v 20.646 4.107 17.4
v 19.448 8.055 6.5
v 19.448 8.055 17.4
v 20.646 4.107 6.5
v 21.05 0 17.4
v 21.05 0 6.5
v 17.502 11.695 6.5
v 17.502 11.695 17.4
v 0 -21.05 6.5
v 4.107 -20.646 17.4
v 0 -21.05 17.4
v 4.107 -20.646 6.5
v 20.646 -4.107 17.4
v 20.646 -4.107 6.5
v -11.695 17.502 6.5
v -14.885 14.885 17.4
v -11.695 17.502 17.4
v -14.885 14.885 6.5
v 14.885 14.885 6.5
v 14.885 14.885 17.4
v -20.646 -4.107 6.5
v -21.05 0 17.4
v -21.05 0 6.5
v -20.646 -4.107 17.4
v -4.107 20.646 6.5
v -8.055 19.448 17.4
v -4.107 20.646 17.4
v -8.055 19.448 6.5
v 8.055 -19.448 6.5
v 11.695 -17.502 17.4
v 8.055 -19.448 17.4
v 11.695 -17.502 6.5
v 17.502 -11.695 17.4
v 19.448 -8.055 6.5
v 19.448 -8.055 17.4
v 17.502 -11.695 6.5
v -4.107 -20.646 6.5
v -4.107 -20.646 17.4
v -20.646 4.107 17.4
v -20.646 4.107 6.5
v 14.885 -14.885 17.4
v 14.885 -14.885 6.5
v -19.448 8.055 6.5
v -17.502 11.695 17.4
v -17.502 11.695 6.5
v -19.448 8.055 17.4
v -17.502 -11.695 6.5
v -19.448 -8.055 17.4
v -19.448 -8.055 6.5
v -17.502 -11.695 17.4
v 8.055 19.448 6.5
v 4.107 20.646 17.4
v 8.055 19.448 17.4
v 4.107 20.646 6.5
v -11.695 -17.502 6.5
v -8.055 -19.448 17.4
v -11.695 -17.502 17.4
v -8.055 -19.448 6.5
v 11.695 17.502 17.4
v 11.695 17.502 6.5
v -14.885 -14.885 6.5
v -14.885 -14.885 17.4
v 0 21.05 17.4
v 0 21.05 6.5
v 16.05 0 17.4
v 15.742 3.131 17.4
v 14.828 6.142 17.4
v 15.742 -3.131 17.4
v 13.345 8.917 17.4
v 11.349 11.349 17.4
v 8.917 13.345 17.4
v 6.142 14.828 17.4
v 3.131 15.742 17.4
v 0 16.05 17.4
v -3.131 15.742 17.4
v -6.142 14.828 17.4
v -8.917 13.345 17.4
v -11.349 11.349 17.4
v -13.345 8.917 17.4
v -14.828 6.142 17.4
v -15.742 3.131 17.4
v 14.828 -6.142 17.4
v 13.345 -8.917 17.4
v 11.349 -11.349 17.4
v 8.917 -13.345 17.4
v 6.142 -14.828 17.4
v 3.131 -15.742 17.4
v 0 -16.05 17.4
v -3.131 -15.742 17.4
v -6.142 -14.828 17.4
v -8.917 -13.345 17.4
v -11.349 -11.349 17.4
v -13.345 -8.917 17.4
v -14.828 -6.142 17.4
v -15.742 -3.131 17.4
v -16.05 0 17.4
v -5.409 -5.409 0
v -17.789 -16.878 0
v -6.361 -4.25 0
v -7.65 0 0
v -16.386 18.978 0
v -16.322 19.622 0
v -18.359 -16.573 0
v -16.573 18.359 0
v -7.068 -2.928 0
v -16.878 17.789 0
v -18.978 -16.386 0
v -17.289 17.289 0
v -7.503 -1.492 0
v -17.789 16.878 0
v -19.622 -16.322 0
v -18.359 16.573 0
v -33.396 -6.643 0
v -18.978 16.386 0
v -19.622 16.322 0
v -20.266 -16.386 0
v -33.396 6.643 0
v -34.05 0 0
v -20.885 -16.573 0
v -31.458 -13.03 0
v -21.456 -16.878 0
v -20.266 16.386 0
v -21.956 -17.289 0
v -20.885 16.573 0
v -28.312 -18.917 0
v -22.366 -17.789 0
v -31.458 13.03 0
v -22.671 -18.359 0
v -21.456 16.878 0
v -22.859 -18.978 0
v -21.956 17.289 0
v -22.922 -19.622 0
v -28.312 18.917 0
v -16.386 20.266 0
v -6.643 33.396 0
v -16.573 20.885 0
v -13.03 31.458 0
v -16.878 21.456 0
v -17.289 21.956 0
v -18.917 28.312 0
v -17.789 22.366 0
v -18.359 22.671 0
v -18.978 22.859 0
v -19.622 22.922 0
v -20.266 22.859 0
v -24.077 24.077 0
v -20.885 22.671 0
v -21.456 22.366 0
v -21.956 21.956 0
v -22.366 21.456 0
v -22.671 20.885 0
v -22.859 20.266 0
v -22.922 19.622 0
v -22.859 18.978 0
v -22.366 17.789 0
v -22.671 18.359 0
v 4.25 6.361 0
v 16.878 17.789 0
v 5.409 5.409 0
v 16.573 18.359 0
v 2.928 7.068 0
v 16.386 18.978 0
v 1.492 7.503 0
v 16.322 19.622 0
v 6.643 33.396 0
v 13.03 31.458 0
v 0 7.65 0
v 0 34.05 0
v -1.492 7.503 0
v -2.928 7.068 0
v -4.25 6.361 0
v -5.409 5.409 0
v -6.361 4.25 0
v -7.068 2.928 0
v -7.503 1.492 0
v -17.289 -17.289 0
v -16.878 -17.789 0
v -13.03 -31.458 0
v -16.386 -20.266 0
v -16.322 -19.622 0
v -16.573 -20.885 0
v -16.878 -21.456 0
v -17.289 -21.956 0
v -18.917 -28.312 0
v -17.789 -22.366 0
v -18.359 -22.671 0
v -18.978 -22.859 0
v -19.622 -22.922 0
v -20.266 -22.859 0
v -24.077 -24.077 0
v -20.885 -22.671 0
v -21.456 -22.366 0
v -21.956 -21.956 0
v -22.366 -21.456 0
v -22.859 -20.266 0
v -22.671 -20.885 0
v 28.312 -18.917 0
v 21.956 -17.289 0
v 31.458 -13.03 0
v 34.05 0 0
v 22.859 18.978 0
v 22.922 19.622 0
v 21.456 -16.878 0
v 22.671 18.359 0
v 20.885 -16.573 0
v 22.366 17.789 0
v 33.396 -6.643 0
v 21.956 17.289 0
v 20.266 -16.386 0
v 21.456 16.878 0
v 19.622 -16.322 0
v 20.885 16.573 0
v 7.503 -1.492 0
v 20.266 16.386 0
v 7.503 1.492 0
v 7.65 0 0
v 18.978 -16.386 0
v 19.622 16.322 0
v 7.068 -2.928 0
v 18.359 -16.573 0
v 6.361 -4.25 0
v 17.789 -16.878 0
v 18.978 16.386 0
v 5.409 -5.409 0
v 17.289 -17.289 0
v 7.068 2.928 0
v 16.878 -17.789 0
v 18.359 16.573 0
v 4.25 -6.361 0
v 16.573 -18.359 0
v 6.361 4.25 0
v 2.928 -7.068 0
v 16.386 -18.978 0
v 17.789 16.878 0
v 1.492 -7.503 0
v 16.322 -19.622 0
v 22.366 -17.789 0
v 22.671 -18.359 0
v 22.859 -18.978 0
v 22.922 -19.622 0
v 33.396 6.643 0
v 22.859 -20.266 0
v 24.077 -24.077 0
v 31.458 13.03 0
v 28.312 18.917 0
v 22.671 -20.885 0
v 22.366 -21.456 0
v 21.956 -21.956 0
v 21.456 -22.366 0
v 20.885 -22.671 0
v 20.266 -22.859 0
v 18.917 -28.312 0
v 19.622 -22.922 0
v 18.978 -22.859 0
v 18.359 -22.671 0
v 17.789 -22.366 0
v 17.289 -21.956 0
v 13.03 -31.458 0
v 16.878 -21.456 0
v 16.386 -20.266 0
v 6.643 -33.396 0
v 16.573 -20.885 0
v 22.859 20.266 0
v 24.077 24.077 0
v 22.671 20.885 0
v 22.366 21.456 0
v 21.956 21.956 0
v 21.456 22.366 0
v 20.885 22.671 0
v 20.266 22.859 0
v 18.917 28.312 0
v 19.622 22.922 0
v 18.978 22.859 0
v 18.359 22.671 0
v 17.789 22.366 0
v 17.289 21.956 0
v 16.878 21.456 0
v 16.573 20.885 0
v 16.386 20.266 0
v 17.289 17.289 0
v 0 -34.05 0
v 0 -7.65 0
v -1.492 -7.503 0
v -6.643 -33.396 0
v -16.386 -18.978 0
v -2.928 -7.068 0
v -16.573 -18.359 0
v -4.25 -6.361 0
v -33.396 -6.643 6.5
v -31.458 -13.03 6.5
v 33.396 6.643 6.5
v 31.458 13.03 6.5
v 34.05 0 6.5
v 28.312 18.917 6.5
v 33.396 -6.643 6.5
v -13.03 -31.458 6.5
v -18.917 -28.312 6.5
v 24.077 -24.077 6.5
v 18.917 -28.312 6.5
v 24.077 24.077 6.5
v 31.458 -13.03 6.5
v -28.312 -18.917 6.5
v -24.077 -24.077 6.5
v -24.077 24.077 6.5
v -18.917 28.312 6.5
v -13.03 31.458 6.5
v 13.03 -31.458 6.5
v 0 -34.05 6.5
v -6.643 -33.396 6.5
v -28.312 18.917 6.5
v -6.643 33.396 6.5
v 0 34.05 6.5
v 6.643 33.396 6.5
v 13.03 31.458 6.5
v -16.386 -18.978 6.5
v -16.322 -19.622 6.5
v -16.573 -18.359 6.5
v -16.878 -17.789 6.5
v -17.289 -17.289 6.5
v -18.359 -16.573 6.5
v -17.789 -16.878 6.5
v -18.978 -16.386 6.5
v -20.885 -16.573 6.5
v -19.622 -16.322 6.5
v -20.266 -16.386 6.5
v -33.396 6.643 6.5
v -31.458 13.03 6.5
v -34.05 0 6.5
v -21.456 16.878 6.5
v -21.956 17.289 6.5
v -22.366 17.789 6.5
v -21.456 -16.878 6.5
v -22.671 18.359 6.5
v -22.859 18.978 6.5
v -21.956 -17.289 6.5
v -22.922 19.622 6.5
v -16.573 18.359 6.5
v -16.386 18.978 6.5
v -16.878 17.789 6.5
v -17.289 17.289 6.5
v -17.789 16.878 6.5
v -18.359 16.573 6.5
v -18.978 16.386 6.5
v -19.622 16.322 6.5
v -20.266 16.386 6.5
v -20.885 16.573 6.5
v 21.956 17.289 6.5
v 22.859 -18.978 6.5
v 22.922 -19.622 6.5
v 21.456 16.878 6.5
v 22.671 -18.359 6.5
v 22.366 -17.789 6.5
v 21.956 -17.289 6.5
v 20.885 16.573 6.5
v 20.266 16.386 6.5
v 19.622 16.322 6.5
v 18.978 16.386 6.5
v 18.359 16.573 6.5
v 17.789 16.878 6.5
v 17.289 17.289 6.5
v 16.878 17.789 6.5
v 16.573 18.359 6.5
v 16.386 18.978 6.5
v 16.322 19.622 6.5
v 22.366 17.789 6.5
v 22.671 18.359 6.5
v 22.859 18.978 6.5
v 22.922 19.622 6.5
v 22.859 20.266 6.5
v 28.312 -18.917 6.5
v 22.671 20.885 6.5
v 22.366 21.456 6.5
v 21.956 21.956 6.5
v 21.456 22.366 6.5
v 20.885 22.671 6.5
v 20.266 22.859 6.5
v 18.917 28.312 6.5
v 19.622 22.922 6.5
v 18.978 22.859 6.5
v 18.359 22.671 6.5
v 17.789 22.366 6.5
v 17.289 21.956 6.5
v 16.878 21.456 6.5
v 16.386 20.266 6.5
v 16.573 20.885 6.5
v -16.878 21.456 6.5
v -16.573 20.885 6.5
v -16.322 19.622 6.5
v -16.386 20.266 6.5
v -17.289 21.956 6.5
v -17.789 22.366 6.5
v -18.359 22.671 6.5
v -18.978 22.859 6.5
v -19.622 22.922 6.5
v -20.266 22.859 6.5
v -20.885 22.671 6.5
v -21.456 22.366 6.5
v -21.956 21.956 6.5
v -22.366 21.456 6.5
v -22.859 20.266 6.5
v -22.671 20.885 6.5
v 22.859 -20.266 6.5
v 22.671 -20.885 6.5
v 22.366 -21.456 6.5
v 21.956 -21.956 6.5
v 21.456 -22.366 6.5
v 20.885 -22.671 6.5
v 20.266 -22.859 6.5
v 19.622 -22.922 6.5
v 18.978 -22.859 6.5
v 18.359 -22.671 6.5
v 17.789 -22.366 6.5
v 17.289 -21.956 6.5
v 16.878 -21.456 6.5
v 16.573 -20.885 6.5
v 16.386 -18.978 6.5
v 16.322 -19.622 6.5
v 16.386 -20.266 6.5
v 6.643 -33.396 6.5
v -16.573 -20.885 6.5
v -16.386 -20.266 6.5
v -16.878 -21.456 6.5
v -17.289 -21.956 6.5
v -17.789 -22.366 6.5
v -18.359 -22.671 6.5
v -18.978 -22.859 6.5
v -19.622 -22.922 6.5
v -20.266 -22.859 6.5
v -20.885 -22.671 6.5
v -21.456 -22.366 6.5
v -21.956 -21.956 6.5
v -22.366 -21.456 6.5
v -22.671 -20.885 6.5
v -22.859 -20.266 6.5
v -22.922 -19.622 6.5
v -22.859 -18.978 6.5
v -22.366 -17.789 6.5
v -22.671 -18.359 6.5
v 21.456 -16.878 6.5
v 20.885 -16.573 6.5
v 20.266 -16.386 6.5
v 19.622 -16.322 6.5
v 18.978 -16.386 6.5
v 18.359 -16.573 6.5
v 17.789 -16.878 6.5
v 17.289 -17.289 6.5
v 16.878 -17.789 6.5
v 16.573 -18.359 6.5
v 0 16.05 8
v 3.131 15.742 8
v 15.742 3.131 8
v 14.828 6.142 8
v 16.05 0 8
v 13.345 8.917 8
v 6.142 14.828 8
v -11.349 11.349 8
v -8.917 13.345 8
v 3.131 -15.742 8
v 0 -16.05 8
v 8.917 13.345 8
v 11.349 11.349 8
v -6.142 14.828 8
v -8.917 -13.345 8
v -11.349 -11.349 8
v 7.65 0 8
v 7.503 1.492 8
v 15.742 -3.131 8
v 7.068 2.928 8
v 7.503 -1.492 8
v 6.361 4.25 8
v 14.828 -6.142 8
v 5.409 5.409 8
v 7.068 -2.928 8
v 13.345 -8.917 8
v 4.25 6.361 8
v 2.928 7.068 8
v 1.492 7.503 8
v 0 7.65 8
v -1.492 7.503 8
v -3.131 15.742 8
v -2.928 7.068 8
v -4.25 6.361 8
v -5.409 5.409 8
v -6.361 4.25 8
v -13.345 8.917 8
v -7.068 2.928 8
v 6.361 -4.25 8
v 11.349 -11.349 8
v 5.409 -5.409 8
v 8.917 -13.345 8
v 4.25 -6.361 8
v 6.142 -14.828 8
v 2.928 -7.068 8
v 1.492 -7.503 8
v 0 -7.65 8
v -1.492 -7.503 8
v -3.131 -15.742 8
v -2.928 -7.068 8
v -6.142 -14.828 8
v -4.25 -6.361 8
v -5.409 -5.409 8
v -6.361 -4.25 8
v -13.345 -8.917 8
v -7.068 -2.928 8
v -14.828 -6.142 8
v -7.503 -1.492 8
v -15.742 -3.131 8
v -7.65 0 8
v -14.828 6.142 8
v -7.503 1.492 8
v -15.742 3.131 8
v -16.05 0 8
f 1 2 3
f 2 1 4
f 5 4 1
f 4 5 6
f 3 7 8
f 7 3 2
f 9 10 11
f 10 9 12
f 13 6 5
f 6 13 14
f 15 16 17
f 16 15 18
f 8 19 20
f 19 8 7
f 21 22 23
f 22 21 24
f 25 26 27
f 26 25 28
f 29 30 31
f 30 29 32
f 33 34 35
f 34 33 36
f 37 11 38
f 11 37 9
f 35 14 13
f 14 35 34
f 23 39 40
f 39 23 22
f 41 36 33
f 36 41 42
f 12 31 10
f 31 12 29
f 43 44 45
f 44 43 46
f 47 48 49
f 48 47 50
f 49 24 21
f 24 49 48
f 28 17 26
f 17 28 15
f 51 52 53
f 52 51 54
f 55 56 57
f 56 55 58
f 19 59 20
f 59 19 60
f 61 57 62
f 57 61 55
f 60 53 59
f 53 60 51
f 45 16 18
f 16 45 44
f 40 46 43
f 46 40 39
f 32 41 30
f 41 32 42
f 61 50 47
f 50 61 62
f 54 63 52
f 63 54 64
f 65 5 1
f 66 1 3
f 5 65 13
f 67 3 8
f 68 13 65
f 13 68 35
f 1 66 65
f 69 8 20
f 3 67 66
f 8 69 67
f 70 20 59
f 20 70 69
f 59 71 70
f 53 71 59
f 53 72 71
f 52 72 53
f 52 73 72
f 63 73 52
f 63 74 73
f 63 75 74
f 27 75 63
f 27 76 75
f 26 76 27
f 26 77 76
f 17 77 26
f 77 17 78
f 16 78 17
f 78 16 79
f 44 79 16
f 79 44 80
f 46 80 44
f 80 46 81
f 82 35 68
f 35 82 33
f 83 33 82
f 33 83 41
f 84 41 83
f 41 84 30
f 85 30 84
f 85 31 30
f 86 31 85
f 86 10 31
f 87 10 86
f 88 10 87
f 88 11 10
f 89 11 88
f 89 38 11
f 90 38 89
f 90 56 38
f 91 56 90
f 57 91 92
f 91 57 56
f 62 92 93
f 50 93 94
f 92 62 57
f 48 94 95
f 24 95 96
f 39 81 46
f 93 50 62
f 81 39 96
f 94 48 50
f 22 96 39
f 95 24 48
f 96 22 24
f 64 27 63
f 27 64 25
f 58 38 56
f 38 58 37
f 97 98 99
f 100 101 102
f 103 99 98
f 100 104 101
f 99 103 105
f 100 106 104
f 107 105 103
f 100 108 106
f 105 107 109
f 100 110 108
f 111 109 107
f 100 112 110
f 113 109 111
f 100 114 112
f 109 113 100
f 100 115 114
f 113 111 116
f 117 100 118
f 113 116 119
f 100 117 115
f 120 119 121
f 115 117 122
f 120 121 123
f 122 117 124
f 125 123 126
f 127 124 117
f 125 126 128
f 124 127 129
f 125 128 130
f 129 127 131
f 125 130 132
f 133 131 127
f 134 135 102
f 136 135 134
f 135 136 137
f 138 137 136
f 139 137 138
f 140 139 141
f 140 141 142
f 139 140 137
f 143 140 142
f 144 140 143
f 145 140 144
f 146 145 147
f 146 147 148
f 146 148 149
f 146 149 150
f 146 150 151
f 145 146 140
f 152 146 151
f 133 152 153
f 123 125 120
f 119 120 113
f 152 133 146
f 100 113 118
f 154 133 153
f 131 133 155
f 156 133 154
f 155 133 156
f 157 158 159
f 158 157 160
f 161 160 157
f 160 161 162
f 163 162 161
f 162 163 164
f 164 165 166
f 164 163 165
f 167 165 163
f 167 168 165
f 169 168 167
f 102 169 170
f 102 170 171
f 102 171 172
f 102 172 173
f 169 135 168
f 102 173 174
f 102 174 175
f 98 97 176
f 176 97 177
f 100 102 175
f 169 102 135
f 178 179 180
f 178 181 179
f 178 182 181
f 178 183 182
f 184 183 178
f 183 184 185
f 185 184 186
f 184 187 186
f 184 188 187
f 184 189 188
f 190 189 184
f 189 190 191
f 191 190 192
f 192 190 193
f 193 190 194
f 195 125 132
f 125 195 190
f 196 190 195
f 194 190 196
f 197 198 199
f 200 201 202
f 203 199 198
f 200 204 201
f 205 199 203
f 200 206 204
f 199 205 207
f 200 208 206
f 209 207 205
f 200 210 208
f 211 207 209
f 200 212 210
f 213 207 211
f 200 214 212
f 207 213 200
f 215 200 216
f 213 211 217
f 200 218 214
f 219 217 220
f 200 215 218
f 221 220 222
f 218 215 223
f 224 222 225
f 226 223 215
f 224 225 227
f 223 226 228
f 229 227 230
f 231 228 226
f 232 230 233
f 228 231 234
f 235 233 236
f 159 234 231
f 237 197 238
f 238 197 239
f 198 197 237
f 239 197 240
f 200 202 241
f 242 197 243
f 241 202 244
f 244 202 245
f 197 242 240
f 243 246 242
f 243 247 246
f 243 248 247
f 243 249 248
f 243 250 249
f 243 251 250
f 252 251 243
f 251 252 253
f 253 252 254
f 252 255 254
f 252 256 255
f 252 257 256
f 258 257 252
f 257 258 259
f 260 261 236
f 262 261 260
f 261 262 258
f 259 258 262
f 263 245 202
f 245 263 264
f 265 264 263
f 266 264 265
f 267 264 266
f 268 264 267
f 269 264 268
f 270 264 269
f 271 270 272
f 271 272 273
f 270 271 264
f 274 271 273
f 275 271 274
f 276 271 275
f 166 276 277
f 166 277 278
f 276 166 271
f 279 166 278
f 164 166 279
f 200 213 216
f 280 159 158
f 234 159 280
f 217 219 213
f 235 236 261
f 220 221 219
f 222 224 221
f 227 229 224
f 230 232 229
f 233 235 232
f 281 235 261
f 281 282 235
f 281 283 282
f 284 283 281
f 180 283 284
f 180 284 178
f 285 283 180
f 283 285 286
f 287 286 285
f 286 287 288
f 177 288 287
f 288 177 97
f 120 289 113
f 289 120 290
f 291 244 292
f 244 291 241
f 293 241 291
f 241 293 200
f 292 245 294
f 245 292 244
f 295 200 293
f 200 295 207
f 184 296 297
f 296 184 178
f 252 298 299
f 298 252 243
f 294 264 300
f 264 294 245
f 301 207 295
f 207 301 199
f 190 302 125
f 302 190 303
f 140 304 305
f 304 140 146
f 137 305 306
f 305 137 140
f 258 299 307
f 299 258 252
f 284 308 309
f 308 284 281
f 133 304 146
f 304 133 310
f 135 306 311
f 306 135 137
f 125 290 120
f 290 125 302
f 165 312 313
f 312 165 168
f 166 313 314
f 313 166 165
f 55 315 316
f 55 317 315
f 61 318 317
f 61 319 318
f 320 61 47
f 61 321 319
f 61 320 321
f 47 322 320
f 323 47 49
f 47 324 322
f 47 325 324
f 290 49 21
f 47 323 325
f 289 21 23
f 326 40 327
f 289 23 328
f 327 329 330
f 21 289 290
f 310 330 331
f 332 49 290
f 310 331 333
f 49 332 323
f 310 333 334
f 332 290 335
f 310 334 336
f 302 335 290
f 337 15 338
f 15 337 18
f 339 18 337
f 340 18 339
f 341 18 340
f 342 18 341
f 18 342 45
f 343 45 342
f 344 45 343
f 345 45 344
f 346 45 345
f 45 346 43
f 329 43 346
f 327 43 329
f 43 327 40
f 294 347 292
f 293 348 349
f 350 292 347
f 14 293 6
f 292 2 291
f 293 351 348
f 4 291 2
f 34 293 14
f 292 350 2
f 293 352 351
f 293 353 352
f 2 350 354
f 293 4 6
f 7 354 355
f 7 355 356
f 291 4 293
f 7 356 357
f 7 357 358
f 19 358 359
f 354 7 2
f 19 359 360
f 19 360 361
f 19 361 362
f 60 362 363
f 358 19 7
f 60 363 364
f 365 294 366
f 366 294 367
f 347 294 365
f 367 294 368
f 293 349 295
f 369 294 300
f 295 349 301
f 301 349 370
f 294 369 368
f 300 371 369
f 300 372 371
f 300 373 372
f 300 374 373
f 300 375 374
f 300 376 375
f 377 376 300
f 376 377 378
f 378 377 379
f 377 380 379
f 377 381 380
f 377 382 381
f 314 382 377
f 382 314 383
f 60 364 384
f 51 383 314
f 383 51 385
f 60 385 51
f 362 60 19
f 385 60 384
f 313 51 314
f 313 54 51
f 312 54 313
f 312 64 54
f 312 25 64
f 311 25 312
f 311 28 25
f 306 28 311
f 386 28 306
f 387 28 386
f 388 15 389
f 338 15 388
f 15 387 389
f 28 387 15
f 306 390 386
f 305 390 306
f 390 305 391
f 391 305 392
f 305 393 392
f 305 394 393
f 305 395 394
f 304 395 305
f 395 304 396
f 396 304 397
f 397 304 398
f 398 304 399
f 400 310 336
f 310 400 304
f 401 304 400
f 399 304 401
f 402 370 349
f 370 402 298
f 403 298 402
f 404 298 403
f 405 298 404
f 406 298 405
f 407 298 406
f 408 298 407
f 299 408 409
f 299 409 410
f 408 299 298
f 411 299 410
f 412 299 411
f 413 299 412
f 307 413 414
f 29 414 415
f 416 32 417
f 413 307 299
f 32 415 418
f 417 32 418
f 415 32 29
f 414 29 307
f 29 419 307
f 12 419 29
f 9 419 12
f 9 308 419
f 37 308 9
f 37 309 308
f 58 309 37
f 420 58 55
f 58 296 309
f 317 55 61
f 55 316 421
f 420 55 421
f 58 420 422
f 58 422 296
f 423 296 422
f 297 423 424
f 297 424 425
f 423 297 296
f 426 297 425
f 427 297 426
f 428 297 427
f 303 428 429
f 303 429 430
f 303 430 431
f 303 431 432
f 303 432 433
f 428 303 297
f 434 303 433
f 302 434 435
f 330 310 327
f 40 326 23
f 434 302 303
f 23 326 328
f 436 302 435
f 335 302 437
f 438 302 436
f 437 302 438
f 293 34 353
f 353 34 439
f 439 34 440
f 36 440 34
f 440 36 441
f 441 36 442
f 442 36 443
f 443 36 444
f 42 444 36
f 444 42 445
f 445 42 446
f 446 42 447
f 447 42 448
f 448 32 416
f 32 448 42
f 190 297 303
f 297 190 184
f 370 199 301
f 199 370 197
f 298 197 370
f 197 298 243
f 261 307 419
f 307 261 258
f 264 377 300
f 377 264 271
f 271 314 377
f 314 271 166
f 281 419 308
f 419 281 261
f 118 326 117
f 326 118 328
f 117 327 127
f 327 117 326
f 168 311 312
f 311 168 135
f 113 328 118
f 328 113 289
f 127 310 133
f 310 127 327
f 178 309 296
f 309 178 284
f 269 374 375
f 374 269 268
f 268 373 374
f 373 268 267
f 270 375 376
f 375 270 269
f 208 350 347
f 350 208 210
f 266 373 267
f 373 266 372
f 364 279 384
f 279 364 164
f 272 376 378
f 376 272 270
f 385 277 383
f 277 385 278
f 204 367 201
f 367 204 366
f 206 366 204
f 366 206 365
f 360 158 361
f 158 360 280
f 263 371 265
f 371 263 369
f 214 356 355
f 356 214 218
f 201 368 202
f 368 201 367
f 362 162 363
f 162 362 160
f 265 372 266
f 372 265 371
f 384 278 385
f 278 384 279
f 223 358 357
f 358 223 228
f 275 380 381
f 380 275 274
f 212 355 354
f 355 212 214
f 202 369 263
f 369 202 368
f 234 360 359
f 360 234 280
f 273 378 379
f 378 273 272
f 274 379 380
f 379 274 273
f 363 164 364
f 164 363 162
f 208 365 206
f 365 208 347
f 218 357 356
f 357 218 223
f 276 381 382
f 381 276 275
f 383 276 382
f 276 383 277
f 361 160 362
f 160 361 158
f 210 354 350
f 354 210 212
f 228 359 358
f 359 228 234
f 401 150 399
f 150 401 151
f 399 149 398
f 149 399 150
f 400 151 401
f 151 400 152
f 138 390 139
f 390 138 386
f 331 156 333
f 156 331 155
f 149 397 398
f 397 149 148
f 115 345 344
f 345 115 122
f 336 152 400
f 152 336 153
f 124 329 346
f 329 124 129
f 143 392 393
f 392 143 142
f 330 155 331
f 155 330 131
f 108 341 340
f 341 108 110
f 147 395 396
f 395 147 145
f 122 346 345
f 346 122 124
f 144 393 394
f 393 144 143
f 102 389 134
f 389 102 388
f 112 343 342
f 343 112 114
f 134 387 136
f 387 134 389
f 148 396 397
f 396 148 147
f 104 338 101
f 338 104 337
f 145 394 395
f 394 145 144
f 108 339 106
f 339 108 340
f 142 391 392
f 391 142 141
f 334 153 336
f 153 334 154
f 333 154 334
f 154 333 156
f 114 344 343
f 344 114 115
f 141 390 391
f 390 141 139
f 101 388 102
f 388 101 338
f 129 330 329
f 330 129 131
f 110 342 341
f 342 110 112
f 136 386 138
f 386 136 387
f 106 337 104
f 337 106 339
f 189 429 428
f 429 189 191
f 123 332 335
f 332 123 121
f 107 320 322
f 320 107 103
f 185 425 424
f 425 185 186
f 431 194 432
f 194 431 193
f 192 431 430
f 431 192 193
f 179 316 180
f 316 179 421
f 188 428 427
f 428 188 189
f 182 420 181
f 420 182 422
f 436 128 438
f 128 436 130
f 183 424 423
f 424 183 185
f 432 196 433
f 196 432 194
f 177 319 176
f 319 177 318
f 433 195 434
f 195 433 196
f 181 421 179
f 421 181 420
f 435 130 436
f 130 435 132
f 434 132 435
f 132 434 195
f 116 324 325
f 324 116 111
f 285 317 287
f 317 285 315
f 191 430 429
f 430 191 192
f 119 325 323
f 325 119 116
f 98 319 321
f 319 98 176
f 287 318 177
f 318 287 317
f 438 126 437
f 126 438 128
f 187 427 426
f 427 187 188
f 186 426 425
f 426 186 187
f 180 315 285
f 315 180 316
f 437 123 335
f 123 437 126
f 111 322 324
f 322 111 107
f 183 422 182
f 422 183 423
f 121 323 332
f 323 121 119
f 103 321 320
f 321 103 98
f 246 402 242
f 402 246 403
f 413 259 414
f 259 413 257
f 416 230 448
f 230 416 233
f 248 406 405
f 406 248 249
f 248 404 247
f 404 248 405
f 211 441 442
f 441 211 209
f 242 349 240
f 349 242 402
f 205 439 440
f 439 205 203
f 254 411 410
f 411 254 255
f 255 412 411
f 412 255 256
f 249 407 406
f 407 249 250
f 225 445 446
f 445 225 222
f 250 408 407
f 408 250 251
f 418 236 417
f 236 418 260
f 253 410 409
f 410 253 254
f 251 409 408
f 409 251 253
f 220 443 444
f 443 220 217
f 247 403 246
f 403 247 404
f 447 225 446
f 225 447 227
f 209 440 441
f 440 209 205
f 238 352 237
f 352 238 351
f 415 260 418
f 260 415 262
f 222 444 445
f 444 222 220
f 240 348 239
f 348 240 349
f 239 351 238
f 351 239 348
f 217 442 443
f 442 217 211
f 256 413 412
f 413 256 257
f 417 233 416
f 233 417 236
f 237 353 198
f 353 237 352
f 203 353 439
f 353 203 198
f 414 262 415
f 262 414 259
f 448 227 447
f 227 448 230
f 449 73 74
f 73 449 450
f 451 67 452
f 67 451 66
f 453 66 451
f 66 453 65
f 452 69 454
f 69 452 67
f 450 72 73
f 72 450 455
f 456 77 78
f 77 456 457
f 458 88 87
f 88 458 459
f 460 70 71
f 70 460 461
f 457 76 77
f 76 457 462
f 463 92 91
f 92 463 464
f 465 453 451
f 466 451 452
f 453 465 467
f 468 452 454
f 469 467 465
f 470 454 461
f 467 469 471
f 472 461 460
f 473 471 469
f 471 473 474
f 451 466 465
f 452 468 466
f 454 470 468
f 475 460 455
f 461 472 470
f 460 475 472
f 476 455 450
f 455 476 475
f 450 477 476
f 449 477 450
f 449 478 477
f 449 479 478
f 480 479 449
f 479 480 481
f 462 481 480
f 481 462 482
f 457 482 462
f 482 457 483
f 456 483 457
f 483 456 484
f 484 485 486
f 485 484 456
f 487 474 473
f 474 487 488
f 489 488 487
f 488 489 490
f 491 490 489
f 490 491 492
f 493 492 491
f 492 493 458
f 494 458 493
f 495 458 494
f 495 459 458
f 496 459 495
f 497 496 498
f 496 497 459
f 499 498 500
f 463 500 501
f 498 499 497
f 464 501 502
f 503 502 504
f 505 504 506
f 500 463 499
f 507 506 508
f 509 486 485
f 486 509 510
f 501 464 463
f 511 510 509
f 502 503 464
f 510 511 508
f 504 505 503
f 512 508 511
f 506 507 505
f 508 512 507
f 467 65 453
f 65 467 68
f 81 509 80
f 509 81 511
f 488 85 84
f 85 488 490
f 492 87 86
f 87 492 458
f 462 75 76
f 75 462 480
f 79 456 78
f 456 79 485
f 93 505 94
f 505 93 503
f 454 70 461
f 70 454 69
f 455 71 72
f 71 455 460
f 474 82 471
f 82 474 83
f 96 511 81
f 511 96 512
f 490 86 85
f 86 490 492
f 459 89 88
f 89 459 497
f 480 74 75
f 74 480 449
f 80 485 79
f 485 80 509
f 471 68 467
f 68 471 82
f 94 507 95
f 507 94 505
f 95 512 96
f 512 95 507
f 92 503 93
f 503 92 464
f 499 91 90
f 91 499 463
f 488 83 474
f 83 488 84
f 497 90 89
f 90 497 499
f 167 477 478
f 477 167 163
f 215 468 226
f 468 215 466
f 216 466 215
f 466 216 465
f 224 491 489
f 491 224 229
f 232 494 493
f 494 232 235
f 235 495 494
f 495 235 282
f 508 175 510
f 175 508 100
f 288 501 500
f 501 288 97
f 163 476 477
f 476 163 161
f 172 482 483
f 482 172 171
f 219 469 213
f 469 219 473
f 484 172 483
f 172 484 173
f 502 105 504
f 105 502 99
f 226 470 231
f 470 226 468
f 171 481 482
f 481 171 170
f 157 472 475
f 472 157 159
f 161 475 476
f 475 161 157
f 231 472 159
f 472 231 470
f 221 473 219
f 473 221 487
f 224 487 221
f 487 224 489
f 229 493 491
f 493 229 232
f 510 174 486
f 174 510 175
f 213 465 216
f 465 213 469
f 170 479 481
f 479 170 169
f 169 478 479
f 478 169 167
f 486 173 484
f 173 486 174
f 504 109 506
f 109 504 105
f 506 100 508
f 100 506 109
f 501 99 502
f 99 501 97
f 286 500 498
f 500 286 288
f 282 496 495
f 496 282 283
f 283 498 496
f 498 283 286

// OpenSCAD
$fn = 32;

// ----------------------------------------------------------------------
// Bearing housing: seat for 6002 (32 x 9 mm), 42.1 mm body
// ----------------------------------------------------------------------

// --- parameters (mm) ---
case_d = 42.1;            // housing outside diameter
case_h = 17.4;            // overall housing height
rim_t = 5;                // wall thickness
bearing_seat = 32.1;      // 6002 seat, 0.1 mm clearance
seat_h = 9.4;             // pocket depth
shoulder = 3;             // shoulder under the bearing
pass_d = 15.3;            // shaft passage
ear_d = 68.1;             // mounting flange diameter
flange_t = 5;             // flange thickness
bolt_d = 6.6;             // flange bolt clearance
bolt_r = 27.75;           // flange bolt circle radius

module body() {
  cylinder(h = case_h, d = case_d);
}

module flange() {
  /* flange sunk 1.5 mm into the body */
  cylinder(h = flange_t + 1.5, d = ear_d);
}

difference() {
  union() {
    body();
    flange();
  }
  translate([0, 0, case_h - seat_h]) cylinder(h = seat_h + 1, d = bearing_seat);
  translate([0, 0, -1]) cylinder(h = case_h - seat_h + 1, d = pass_d);
  for (i = [0 : 3]) rotate([0, 0, 45 + i * 90]) translate([bolt_r, 0, -1])
    cylinder(h = flange_t + 3, d = bolt_d);
}
